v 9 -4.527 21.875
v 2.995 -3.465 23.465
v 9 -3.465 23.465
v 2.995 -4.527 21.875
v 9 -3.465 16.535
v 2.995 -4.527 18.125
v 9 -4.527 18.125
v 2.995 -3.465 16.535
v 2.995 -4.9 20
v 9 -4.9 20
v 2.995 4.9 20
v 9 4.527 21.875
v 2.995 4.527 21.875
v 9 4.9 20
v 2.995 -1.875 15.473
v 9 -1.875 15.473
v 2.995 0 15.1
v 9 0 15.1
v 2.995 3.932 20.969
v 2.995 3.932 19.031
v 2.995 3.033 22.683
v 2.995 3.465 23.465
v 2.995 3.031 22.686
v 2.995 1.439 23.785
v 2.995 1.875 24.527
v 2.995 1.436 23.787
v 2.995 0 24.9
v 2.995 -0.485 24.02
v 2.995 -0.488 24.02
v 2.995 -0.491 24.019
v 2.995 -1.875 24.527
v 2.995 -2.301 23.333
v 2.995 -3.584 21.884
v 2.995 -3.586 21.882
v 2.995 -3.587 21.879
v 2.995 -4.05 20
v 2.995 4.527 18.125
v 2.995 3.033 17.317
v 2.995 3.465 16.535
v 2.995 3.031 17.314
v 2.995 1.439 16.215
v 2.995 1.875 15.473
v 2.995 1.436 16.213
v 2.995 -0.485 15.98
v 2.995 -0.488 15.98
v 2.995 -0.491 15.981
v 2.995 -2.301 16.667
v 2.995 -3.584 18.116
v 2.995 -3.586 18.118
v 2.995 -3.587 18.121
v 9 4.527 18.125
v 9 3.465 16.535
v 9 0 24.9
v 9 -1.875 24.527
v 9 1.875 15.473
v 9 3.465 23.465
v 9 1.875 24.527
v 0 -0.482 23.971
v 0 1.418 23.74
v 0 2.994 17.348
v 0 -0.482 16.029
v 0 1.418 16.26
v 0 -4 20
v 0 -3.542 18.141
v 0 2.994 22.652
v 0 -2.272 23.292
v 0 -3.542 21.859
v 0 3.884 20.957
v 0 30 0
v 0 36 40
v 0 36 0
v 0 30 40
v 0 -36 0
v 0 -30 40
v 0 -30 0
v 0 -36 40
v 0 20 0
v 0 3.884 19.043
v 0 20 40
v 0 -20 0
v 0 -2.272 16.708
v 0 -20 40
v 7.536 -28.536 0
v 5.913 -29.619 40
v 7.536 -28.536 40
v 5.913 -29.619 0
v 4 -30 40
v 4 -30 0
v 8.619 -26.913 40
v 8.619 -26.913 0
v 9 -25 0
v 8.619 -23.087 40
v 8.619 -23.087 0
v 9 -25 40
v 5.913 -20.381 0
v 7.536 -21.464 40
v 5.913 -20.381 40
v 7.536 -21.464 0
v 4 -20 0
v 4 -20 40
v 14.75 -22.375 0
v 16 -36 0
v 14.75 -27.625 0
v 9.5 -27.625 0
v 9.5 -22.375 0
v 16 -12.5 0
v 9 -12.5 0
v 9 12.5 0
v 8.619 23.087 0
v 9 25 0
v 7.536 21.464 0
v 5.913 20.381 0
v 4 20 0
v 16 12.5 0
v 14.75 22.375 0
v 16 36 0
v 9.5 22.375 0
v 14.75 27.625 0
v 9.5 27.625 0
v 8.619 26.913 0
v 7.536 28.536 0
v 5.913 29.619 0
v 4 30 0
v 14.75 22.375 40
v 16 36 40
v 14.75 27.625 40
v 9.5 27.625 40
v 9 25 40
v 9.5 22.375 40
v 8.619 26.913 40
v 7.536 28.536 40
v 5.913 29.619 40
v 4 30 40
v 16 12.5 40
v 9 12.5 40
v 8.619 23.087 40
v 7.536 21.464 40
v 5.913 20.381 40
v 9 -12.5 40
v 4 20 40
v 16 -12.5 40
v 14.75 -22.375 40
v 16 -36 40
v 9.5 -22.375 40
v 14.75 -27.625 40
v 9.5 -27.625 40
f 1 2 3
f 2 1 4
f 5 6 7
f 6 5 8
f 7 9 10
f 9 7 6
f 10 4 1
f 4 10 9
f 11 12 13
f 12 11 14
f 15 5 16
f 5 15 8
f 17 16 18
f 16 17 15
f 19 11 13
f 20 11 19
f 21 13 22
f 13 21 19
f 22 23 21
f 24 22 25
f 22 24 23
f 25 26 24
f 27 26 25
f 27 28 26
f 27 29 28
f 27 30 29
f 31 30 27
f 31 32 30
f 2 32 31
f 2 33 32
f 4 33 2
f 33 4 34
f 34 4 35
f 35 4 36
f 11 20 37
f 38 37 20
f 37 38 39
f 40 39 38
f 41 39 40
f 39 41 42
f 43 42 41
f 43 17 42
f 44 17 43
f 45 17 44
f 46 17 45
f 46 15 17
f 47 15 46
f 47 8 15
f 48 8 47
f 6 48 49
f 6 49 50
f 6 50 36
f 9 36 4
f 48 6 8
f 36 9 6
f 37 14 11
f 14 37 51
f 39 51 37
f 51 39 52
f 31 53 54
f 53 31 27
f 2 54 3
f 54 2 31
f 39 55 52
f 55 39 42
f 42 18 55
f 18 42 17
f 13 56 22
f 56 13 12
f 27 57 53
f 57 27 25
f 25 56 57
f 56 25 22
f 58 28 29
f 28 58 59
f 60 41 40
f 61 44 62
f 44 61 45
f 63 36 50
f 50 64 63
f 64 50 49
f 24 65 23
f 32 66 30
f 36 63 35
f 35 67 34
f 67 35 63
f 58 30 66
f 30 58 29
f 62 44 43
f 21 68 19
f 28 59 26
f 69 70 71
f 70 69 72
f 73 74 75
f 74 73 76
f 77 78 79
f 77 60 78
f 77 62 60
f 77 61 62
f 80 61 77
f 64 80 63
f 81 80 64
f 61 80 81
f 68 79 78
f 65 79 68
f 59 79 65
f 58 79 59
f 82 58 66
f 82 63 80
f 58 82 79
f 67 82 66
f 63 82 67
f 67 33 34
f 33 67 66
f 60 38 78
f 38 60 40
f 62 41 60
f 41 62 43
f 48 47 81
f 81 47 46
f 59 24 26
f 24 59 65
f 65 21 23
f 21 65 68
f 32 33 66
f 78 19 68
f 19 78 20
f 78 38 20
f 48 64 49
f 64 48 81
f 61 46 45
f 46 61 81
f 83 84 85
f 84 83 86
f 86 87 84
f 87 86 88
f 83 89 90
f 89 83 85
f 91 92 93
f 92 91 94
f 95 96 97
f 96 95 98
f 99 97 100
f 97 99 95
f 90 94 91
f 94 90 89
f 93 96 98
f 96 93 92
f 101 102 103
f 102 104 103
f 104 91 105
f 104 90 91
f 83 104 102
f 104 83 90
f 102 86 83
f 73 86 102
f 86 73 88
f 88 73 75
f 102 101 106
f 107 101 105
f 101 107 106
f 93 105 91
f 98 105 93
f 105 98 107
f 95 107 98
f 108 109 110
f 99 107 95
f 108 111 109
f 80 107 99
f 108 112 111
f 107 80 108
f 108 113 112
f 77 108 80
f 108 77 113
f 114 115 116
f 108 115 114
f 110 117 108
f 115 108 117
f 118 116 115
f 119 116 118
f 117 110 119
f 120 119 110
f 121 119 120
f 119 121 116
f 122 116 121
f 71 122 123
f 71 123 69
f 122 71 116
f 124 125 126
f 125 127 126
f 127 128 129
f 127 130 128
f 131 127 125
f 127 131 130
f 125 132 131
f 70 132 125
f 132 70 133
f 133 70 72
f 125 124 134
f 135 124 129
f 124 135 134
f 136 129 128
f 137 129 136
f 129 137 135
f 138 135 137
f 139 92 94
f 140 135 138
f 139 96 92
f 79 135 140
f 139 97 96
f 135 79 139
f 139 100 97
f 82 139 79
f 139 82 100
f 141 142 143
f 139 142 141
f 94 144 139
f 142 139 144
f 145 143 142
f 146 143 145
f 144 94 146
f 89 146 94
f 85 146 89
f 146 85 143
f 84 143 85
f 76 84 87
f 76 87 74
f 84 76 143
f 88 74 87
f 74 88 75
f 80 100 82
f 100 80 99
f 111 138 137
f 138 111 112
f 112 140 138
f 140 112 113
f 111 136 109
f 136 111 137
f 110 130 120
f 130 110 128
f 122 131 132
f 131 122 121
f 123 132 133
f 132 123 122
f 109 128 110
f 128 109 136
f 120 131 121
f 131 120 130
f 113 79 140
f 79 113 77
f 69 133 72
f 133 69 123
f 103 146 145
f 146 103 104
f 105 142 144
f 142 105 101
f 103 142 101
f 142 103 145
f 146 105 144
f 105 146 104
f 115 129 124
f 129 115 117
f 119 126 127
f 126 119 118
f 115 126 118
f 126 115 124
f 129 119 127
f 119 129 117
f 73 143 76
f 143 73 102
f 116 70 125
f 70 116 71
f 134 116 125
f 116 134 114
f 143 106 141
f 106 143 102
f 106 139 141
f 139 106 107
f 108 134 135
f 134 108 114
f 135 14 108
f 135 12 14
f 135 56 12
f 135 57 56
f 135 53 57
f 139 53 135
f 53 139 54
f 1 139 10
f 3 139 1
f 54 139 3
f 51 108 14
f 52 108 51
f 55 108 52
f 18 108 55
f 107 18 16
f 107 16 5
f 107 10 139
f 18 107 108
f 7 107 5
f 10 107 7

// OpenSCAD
// Dial Indicator Level Jig
// for  PRUSA Mendel  
// GNU GPL v3
// Stephen Carpenter
// sjc@carpanet.net

// Parameters

// Magnets
MagW = 5;
MagH  = 5;
MagGap = .25;
MagOff = 2 * MagGap;

// Rods
RodSep = 50;
RodRad  =   4;
RodGap = 1;

// Body
BodyL = 40;
BodyW = 72;
BodyH = 16;
ChanH = 9;

// Mount
MountL = 20;
MountR1=4.05;
MountR2=4.0;
MountL1=6;
MountL2=3;
VoidW=25;

module rodchannel(rad = RodRad, gap = RodGap, len=BodyL, chanH = 2 * (RodRad + RodGap) ) {
	chanR = rad + gap;
	chanW = 2 * chanR;
	chanbox = chanH - chanR;
	difference() {
		translate([0,0,0]) union() {
			translate([0,chanH-chanR,0])
				cylinder(r=chanR, h=BodyL);
			if (chanH > chanR/2) {
				translate([0,chanbox/2,BodyL/2])
					 cube([chanW, chanbox, BodyL], center=true);
			}
		}
		
		if (chanH < (2 * chanR)) {
			translate([-chanW/2,-(2 * chanR - chanH),0])
				cube([chanW, 2 * chanR - chanH,BodyL]);
		}
	}
}

//translate([0,0,10]) rotate([0,90,0]) 
//	levelerjigOld();


module levelerJig(chanH = ChanH, magOff = MagOff) {
	chanOff = BodyH - ChanH;
	magh = MagH + MagGap;
	voidh = BodyH - (MountL1 + MountL2);

	difference() {
		// Body
		translate([-BodyW/2,0,0]) 
			cube([BodyW,BodyH,BodyL]);

		// Top void
		translate([0,BodyH - voidh/2,BodyL/2])
			#cube([VoidW,voidh, BodyL], center=true);

		// Indicator mount
		translate([0,(MountL1/2 + 3 * MountL2/4),BodyL/2])#rotate([-90,0,0]) union (){
				translate([0,0,MountL2/4]) 
					cylinder(r=4.9, h=MountL1 + .01, center=true);
				translate([0,0,-(MountL1/2 + MountL2/4)]) 
					cylinder(r1=MountR2, r2=MountR1, h=MountL2, center=true);
		}


		// Add 2 Rod Channels
		for(i = [RodSep/2, -RodSep/2]) {
			translate([i, chanH + magh/2 + magOff, BodyL/2])
				cube([MagW + MagGap, magh, BodyL], center = true);
			translate([i,-1,0])
				rodchannel(chanH = (chanH + 1));
		}
	}
}

rotate([0,0,-90])levelerJig();
//rodchannel(chanH=10);
